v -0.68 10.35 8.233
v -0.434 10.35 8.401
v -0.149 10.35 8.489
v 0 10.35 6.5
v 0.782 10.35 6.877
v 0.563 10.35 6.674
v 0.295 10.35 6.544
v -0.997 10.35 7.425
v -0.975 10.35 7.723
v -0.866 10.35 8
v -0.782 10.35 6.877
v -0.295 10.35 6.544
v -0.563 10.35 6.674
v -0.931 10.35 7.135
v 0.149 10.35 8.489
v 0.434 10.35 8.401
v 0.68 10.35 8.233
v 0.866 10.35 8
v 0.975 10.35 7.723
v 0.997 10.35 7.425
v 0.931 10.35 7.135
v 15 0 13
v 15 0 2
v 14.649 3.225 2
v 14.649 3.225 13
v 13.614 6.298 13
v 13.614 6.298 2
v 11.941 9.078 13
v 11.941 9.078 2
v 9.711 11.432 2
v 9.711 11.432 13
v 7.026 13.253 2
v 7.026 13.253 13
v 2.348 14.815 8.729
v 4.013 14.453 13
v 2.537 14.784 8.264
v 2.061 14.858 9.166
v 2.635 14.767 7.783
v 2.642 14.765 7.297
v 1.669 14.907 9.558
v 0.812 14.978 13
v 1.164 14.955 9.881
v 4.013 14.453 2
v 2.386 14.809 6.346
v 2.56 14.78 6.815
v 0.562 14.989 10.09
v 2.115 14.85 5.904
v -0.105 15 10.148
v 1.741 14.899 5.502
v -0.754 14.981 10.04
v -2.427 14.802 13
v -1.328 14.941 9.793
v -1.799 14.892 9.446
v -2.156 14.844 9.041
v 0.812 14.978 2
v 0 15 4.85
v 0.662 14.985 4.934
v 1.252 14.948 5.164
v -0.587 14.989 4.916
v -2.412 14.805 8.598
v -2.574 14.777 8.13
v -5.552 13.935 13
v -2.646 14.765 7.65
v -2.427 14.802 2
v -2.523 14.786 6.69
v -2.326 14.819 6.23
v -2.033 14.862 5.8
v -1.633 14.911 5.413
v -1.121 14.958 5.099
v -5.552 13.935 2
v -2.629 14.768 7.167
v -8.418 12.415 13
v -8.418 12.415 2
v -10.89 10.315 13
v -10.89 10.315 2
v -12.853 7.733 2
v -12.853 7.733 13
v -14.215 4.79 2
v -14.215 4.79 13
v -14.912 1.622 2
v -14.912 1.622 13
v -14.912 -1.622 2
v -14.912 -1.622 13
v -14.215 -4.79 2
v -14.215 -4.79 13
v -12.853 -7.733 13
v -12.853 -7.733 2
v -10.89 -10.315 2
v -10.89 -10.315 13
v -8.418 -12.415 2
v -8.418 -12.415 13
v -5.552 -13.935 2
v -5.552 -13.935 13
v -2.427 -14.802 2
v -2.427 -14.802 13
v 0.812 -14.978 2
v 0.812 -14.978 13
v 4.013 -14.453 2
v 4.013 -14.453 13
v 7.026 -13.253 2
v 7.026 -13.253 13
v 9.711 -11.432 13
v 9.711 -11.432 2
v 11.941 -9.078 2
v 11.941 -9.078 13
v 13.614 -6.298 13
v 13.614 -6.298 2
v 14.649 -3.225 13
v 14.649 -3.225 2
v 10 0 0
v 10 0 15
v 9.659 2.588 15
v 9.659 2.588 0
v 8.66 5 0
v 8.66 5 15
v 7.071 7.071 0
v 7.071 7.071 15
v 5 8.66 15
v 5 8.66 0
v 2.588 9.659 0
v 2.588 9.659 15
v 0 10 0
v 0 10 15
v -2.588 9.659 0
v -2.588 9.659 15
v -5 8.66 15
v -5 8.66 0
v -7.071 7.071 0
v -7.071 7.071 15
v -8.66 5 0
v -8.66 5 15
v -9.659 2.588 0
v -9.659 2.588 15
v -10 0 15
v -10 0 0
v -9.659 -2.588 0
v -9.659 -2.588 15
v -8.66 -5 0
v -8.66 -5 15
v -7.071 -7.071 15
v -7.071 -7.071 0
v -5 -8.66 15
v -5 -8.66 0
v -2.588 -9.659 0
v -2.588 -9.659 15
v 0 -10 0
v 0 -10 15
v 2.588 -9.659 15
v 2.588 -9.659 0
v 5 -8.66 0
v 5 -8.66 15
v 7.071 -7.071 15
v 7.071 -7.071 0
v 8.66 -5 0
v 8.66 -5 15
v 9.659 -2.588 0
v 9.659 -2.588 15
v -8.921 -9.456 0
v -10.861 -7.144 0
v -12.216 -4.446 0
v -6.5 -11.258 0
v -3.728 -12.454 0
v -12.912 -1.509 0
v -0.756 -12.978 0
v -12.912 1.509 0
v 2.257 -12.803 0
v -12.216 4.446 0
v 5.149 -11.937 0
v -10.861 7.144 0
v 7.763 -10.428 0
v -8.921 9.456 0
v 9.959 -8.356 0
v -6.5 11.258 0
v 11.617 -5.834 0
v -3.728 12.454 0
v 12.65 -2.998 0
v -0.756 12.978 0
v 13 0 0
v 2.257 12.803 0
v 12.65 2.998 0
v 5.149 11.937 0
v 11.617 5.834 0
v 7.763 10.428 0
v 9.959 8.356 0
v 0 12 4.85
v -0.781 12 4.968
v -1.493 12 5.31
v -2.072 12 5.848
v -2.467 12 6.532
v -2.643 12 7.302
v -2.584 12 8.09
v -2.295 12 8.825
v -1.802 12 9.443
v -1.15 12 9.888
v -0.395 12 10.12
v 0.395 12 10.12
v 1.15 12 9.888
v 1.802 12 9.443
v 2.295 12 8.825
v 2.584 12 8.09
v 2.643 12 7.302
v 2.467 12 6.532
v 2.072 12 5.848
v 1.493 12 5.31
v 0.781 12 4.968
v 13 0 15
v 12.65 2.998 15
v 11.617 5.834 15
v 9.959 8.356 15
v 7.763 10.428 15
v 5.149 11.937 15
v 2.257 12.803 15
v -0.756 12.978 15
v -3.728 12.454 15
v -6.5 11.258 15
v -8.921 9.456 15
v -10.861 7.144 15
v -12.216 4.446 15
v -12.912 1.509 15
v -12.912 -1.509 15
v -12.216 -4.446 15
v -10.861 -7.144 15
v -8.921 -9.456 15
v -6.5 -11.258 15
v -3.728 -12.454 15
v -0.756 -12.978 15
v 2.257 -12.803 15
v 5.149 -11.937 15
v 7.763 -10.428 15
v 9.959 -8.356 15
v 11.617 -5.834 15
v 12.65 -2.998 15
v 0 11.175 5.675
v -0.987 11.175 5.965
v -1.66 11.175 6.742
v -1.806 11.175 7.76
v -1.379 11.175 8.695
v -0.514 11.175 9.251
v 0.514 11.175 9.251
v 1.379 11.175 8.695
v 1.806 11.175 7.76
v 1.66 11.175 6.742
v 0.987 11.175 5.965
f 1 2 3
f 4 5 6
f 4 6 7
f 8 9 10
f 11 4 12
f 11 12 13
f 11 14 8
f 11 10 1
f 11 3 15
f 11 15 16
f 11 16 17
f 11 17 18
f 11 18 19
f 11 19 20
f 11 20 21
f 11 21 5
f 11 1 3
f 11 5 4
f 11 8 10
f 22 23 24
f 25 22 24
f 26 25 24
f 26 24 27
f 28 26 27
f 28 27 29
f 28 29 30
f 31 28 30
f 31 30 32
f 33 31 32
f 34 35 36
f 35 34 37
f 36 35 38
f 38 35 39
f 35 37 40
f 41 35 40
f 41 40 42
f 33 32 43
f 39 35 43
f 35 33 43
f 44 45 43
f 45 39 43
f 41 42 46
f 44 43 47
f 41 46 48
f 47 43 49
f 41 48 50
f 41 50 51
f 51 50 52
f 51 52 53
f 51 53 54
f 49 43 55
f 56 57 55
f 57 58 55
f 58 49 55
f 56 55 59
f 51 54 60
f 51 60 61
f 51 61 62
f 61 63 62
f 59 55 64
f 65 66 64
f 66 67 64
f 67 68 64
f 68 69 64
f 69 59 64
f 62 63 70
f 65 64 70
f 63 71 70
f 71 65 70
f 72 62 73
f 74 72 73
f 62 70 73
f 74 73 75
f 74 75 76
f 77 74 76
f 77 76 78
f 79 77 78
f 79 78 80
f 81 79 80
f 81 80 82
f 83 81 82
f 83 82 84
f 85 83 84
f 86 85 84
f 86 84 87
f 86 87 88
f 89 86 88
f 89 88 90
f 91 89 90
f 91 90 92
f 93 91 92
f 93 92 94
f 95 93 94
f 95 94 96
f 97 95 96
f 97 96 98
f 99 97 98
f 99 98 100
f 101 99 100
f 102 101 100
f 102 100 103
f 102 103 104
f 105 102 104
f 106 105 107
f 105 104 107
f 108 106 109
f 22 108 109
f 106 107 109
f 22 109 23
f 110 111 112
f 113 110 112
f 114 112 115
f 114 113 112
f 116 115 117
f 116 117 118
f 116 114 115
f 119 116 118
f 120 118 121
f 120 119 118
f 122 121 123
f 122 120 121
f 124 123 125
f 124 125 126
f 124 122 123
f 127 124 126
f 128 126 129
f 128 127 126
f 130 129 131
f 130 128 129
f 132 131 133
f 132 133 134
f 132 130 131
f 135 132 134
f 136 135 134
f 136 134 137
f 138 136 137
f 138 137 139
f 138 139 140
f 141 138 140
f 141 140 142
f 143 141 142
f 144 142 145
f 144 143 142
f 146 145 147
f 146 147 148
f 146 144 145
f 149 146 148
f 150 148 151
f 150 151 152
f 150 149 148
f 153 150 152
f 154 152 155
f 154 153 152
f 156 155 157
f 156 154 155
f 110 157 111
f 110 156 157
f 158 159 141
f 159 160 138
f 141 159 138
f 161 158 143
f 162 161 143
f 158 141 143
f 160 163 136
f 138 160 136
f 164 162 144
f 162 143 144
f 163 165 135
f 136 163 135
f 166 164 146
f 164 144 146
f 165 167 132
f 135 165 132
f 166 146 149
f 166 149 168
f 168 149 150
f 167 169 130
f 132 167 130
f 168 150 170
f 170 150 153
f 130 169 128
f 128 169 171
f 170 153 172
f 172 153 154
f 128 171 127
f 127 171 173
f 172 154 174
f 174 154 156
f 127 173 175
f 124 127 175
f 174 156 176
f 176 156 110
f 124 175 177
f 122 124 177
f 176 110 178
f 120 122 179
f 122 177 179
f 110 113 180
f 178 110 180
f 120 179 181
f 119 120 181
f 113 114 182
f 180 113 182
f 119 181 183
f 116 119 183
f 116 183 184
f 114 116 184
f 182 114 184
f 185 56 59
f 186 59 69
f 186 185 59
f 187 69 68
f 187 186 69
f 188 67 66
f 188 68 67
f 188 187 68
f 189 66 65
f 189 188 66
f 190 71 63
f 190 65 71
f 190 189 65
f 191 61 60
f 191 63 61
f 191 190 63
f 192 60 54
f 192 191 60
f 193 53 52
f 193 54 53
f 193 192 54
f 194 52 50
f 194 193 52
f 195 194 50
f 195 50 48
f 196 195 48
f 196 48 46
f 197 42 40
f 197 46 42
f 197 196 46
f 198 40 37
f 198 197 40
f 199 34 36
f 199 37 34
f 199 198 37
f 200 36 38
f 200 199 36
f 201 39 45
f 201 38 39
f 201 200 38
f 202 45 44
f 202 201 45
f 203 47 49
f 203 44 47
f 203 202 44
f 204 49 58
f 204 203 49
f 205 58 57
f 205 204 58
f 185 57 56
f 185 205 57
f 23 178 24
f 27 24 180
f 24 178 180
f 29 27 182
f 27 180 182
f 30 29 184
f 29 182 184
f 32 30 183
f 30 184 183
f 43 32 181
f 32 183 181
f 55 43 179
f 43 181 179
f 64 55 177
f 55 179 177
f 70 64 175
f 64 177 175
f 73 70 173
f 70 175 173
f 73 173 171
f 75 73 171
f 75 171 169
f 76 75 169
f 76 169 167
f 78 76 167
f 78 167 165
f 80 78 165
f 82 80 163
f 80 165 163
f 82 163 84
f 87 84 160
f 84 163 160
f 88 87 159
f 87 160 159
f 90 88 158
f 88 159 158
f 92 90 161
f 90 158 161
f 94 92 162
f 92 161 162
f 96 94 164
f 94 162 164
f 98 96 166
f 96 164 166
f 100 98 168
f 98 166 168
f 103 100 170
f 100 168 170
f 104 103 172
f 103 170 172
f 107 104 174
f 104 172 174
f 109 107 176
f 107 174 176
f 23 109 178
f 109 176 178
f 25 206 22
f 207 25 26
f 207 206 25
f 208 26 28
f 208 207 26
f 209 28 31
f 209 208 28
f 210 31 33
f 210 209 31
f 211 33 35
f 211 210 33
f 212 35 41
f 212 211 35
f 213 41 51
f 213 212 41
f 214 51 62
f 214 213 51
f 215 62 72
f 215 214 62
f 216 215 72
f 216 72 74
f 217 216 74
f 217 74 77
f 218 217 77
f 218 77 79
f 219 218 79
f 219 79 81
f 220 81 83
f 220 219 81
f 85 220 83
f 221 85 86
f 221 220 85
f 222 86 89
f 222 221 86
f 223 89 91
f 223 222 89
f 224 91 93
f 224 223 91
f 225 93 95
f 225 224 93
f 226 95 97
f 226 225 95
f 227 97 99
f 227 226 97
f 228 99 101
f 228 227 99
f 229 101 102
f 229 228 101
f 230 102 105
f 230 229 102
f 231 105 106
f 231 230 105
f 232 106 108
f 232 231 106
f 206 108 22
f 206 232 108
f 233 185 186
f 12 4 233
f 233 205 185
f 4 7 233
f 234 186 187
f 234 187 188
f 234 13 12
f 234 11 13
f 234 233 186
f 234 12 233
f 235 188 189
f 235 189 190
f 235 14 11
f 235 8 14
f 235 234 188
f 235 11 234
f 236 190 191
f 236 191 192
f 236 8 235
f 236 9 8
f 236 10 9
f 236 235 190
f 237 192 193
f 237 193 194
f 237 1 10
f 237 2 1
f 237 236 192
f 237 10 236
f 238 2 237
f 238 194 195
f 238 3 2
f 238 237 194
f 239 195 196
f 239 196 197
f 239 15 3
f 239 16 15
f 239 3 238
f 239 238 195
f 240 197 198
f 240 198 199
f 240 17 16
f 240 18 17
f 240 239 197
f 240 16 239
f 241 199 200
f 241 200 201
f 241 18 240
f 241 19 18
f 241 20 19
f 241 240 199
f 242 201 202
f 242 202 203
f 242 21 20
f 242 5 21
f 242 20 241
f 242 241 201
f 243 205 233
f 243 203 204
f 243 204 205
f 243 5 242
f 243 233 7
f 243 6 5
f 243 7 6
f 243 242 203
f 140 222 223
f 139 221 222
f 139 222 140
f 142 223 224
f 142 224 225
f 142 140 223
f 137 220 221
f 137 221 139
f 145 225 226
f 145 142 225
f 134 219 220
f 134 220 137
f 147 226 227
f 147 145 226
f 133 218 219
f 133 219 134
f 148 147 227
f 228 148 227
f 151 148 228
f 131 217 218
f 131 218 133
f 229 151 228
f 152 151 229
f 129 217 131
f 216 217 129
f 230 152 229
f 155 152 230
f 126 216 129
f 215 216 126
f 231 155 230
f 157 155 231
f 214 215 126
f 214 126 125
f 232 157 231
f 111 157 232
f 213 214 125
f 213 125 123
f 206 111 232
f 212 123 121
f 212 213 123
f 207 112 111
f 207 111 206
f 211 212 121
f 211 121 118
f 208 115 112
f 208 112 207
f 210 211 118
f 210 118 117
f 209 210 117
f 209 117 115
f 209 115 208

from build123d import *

# Parameters (mm, degrees)
SKETCH_1_R      = 15
SKETCH_1_R_2    = 10
EXTRUDE_1_DEPTH = 15
CHAMFER_1_SIZE  = 2


with BuildPart() as part:
    # Эскиз1 → Бобышка-Вытянуть1 (new body)
    with BuildSketch(Plane.XY):
        Circle(SKETCH_1_R)
        Circle(SKETCH_1_R_2, mode=Mode.SUBTRACT)
    extrude(amount=EXTRUDE_1_DEPTH)

    # Фаска1
    chamfer_1_edges = [part.edges().sort_by_distance(p)[0] for p in [
        (-15, 0, 0),
        (-15, 0, 15),
    ]]
    chamfer(chamfer_1_edges, length=CHAMFER_1_SIZE)

    # Эскиз2 → Вырез-Повернуть1 (revolve, cut)
    with BuildSketch(Plane(origin=(0, 0, 0), x_dir=(0, 0, -1), z_dir=(1, 0, 0)), mode=Mode.PRIVATE) as cut_revolve_1_sk:
        Polygon((-7.5, 15), (-10.15, 15), (-10.15, 12), (-8.5, 10.35), (-7.5, 10.35), align=None)
    revolve(cut_revolve_1_sk.sketch.rotate(Axis((0, 0, 7.5), (0, 1, 0)), 180), axis=Axis((0, 0, 7.5), (0, 1, 0)), mode=Mode.SUBTRACT)


solid = part.part
